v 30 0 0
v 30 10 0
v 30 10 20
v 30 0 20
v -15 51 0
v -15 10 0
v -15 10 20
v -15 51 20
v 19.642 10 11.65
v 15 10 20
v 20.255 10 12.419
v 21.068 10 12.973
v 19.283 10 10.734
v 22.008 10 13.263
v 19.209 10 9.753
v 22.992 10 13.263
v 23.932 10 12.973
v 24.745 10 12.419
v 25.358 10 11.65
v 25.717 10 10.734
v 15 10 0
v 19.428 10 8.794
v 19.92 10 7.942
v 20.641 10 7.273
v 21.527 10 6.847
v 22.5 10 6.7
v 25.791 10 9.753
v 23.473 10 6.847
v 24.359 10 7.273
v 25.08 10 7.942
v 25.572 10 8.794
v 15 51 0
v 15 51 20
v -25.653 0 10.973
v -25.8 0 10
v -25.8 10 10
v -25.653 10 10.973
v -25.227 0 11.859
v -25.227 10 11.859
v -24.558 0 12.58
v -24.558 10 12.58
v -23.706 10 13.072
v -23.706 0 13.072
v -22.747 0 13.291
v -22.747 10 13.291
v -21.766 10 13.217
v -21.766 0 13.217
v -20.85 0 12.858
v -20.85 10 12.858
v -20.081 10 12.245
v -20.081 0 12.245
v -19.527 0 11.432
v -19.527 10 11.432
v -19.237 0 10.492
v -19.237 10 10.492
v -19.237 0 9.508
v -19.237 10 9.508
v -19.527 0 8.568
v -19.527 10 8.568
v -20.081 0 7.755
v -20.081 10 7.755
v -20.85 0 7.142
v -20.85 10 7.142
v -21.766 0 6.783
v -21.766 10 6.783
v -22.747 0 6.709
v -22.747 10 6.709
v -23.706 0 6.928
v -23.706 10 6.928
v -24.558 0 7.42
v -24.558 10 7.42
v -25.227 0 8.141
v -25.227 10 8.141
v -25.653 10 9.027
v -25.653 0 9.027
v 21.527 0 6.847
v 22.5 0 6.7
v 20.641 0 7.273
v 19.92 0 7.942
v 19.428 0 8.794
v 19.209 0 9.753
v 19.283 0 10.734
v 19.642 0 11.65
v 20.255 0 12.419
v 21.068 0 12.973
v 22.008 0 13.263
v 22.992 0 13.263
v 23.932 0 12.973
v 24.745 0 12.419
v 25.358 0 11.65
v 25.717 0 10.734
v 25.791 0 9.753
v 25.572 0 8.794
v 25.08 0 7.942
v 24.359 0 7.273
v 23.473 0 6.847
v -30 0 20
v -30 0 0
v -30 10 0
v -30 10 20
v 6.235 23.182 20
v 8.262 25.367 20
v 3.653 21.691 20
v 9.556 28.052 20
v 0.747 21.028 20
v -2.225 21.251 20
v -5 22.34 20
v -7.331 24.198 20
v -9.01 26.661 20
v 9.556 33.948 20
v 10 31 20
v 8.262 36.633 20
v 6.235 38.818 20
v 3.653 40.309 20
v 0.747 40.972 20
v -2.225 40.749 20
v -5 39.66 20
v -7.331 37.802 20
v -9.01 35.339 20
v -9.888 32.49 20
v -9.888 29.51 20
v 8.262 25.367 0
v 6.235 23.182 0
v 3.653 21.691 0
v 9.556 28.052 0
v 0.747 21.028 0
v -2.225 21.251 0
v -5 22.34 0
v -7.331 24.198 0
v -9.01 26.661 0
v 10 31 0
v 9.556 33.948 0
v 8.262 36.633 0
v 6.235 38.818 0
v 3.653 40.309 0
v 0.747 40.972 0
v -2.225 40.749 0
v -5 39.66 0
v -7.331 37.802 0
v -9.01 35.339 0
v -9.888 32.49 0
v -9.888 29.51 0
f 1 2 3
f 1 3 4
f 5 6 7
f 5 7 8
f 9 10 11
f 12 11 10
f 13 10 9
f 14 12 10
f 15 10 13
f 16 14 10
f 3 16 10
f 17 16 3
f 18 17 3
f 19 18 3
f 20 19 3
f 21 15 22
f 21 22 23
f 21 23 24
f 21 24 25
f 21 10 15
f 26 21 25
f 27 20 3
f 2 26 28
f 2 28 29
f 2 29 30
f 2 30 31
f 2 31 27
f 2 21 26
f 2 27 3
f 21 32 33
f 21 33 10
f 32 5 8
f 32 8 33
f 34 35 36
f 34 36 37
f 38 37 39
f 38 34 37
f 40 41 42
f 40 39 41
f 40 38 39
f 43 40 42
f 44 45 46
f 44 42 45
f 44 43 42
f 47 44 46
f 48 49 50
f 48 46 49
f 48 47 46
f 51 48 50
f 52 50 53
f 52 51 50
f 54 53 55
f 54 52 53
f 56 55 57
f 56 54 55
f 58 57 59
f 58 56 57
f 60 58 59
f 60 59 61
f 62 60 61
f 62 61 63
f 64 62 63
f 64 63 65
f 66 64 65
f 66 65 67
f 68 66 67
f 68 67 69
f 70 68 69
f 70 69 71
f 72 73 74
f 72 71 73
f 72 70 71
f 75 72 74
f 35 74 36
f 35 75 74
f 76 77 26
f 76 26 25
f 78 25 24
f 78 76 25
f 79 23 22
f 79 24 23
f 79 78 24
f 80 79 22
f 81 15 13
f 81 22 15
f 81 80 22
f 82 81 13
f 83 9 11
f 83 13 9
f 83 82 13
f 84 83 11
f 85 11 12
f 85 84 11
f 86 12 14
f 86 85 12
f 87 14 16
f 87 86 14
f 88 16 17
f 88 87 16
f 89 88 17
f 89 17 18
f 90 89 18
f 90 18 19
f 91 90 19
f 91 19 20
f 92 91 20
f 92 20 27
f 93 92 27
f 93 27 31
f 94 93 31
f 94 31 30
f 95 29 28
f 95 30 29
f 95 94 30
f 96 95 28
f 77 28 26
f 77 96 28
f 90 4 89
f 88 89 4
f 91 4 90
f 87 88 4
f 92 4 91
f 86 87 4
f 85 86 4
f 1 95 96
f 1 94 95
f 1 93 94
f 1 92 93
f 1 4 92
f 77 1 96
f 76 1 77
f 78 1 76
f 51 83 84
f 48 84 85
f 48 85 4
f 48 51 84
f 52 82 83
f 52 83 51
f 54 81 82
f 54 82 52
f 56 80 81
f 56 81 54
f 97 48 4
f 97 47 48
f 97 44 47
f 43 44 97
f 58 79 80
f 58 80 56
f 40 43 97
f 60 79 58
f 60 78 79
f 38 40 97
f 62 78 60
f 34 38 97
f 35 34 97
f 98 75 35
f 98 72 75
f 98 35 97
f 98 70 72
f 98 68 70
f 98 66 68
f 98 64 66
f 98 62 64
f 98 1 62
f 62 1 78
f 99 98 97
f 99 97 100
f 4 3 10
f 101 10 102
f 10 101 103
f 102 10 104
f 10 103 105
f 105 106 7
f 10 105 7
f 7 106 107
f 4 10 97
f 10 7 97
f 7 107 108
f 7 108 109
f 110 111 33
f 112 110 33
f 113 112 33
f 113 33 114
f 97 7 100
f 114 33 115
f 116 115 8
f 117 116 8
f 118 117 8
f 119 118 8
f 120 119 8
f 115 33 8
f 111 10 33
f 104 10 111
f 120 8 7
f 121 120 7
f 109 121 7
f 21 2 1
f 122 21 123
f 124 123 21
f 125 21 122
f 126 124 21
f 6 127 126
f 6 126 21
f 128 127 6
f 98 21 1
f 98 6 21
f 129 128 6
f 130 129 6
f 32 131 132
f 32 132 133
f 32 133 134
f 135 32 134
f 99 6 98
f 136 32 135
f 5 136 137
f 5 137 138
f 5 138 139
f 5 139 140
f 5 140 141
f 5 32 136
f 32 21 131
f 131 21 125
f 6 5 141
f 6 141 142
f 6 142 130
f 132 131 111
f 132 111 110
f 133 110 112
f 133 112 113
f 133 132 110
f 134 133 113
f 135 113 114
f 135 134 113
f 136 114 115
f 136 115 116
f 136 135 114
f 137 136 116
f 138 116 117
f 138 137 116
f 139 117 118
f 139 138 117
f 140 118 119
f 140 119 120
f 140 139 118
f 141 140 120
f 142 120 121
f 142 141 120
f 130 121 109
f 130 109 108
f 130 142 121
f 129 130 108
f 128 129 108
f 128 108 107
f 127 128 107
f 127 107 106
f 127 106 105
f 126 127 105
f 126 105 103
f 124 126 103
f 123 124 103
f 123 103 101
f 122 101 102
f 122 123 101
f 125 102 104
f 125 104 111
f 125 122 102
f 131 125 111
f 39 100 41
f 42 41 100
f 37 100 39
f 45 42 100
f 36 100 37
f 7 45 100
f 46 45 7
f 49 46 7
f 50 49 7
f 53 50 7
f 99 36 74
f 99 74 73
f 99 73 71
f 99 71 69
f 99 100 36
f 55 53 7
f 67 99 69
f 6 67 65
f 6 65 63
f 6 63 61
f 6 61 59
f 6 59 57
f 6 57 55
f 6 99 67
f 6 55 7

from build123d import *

# Parameters (mm, degrees)
SKETCH_1_R               = 10
EXTRUDE_1_DEPTH          = 20
CUT_EXTRUDE_1_DEPTH      = 55.598534779
CUT_EXTRUDE_1_DEPTH_BACK = 55.598534779
SKETCH_2_R               = 3.3


with BuildPart() as part:
    # 草图1 → 凸台-拉伸1 (new body)
    with BuildSketch(Plane.XY):
        Polygon((-15, 51), (15, 51), (15, 10), (30, 10), (30, 0), (-30, 0), (-30, 10), (-15, 10), align=None)
        with Locations((0, 31)):
            Circle(SKETCH_1_R, mode=Mode.SUBTRACT)
    extrude(amount=EXTRUDE_1_DEPTH)

    # 草图2 → 切除-拉伸1 (cut, two sides: drawn at the far end of the back side and taken through both)
    with BuildSketch(Plane(origin=(0, 10, 0), x_dir=(1, 0, 0), z_dir=(0, 1, 0)).offset(-CUT_EXTRUDE_1_DEPTH_BACK)):
        with Locations(Location((-22.5, -10, 0), (0, 0, 180))):
            Circle(SKETCH_2_R)
        with Locations(Location((22.5, -10, 0), (0, 0, 90))):
            Circle(SKETCH_2_R)
    extrude(amount=CUT_EXTRUDE_1_DEPTH + CUT_EXTRUDE_1_DEPTH_BACK, mode=Mode.SUBTRACT)


solid = part.part
